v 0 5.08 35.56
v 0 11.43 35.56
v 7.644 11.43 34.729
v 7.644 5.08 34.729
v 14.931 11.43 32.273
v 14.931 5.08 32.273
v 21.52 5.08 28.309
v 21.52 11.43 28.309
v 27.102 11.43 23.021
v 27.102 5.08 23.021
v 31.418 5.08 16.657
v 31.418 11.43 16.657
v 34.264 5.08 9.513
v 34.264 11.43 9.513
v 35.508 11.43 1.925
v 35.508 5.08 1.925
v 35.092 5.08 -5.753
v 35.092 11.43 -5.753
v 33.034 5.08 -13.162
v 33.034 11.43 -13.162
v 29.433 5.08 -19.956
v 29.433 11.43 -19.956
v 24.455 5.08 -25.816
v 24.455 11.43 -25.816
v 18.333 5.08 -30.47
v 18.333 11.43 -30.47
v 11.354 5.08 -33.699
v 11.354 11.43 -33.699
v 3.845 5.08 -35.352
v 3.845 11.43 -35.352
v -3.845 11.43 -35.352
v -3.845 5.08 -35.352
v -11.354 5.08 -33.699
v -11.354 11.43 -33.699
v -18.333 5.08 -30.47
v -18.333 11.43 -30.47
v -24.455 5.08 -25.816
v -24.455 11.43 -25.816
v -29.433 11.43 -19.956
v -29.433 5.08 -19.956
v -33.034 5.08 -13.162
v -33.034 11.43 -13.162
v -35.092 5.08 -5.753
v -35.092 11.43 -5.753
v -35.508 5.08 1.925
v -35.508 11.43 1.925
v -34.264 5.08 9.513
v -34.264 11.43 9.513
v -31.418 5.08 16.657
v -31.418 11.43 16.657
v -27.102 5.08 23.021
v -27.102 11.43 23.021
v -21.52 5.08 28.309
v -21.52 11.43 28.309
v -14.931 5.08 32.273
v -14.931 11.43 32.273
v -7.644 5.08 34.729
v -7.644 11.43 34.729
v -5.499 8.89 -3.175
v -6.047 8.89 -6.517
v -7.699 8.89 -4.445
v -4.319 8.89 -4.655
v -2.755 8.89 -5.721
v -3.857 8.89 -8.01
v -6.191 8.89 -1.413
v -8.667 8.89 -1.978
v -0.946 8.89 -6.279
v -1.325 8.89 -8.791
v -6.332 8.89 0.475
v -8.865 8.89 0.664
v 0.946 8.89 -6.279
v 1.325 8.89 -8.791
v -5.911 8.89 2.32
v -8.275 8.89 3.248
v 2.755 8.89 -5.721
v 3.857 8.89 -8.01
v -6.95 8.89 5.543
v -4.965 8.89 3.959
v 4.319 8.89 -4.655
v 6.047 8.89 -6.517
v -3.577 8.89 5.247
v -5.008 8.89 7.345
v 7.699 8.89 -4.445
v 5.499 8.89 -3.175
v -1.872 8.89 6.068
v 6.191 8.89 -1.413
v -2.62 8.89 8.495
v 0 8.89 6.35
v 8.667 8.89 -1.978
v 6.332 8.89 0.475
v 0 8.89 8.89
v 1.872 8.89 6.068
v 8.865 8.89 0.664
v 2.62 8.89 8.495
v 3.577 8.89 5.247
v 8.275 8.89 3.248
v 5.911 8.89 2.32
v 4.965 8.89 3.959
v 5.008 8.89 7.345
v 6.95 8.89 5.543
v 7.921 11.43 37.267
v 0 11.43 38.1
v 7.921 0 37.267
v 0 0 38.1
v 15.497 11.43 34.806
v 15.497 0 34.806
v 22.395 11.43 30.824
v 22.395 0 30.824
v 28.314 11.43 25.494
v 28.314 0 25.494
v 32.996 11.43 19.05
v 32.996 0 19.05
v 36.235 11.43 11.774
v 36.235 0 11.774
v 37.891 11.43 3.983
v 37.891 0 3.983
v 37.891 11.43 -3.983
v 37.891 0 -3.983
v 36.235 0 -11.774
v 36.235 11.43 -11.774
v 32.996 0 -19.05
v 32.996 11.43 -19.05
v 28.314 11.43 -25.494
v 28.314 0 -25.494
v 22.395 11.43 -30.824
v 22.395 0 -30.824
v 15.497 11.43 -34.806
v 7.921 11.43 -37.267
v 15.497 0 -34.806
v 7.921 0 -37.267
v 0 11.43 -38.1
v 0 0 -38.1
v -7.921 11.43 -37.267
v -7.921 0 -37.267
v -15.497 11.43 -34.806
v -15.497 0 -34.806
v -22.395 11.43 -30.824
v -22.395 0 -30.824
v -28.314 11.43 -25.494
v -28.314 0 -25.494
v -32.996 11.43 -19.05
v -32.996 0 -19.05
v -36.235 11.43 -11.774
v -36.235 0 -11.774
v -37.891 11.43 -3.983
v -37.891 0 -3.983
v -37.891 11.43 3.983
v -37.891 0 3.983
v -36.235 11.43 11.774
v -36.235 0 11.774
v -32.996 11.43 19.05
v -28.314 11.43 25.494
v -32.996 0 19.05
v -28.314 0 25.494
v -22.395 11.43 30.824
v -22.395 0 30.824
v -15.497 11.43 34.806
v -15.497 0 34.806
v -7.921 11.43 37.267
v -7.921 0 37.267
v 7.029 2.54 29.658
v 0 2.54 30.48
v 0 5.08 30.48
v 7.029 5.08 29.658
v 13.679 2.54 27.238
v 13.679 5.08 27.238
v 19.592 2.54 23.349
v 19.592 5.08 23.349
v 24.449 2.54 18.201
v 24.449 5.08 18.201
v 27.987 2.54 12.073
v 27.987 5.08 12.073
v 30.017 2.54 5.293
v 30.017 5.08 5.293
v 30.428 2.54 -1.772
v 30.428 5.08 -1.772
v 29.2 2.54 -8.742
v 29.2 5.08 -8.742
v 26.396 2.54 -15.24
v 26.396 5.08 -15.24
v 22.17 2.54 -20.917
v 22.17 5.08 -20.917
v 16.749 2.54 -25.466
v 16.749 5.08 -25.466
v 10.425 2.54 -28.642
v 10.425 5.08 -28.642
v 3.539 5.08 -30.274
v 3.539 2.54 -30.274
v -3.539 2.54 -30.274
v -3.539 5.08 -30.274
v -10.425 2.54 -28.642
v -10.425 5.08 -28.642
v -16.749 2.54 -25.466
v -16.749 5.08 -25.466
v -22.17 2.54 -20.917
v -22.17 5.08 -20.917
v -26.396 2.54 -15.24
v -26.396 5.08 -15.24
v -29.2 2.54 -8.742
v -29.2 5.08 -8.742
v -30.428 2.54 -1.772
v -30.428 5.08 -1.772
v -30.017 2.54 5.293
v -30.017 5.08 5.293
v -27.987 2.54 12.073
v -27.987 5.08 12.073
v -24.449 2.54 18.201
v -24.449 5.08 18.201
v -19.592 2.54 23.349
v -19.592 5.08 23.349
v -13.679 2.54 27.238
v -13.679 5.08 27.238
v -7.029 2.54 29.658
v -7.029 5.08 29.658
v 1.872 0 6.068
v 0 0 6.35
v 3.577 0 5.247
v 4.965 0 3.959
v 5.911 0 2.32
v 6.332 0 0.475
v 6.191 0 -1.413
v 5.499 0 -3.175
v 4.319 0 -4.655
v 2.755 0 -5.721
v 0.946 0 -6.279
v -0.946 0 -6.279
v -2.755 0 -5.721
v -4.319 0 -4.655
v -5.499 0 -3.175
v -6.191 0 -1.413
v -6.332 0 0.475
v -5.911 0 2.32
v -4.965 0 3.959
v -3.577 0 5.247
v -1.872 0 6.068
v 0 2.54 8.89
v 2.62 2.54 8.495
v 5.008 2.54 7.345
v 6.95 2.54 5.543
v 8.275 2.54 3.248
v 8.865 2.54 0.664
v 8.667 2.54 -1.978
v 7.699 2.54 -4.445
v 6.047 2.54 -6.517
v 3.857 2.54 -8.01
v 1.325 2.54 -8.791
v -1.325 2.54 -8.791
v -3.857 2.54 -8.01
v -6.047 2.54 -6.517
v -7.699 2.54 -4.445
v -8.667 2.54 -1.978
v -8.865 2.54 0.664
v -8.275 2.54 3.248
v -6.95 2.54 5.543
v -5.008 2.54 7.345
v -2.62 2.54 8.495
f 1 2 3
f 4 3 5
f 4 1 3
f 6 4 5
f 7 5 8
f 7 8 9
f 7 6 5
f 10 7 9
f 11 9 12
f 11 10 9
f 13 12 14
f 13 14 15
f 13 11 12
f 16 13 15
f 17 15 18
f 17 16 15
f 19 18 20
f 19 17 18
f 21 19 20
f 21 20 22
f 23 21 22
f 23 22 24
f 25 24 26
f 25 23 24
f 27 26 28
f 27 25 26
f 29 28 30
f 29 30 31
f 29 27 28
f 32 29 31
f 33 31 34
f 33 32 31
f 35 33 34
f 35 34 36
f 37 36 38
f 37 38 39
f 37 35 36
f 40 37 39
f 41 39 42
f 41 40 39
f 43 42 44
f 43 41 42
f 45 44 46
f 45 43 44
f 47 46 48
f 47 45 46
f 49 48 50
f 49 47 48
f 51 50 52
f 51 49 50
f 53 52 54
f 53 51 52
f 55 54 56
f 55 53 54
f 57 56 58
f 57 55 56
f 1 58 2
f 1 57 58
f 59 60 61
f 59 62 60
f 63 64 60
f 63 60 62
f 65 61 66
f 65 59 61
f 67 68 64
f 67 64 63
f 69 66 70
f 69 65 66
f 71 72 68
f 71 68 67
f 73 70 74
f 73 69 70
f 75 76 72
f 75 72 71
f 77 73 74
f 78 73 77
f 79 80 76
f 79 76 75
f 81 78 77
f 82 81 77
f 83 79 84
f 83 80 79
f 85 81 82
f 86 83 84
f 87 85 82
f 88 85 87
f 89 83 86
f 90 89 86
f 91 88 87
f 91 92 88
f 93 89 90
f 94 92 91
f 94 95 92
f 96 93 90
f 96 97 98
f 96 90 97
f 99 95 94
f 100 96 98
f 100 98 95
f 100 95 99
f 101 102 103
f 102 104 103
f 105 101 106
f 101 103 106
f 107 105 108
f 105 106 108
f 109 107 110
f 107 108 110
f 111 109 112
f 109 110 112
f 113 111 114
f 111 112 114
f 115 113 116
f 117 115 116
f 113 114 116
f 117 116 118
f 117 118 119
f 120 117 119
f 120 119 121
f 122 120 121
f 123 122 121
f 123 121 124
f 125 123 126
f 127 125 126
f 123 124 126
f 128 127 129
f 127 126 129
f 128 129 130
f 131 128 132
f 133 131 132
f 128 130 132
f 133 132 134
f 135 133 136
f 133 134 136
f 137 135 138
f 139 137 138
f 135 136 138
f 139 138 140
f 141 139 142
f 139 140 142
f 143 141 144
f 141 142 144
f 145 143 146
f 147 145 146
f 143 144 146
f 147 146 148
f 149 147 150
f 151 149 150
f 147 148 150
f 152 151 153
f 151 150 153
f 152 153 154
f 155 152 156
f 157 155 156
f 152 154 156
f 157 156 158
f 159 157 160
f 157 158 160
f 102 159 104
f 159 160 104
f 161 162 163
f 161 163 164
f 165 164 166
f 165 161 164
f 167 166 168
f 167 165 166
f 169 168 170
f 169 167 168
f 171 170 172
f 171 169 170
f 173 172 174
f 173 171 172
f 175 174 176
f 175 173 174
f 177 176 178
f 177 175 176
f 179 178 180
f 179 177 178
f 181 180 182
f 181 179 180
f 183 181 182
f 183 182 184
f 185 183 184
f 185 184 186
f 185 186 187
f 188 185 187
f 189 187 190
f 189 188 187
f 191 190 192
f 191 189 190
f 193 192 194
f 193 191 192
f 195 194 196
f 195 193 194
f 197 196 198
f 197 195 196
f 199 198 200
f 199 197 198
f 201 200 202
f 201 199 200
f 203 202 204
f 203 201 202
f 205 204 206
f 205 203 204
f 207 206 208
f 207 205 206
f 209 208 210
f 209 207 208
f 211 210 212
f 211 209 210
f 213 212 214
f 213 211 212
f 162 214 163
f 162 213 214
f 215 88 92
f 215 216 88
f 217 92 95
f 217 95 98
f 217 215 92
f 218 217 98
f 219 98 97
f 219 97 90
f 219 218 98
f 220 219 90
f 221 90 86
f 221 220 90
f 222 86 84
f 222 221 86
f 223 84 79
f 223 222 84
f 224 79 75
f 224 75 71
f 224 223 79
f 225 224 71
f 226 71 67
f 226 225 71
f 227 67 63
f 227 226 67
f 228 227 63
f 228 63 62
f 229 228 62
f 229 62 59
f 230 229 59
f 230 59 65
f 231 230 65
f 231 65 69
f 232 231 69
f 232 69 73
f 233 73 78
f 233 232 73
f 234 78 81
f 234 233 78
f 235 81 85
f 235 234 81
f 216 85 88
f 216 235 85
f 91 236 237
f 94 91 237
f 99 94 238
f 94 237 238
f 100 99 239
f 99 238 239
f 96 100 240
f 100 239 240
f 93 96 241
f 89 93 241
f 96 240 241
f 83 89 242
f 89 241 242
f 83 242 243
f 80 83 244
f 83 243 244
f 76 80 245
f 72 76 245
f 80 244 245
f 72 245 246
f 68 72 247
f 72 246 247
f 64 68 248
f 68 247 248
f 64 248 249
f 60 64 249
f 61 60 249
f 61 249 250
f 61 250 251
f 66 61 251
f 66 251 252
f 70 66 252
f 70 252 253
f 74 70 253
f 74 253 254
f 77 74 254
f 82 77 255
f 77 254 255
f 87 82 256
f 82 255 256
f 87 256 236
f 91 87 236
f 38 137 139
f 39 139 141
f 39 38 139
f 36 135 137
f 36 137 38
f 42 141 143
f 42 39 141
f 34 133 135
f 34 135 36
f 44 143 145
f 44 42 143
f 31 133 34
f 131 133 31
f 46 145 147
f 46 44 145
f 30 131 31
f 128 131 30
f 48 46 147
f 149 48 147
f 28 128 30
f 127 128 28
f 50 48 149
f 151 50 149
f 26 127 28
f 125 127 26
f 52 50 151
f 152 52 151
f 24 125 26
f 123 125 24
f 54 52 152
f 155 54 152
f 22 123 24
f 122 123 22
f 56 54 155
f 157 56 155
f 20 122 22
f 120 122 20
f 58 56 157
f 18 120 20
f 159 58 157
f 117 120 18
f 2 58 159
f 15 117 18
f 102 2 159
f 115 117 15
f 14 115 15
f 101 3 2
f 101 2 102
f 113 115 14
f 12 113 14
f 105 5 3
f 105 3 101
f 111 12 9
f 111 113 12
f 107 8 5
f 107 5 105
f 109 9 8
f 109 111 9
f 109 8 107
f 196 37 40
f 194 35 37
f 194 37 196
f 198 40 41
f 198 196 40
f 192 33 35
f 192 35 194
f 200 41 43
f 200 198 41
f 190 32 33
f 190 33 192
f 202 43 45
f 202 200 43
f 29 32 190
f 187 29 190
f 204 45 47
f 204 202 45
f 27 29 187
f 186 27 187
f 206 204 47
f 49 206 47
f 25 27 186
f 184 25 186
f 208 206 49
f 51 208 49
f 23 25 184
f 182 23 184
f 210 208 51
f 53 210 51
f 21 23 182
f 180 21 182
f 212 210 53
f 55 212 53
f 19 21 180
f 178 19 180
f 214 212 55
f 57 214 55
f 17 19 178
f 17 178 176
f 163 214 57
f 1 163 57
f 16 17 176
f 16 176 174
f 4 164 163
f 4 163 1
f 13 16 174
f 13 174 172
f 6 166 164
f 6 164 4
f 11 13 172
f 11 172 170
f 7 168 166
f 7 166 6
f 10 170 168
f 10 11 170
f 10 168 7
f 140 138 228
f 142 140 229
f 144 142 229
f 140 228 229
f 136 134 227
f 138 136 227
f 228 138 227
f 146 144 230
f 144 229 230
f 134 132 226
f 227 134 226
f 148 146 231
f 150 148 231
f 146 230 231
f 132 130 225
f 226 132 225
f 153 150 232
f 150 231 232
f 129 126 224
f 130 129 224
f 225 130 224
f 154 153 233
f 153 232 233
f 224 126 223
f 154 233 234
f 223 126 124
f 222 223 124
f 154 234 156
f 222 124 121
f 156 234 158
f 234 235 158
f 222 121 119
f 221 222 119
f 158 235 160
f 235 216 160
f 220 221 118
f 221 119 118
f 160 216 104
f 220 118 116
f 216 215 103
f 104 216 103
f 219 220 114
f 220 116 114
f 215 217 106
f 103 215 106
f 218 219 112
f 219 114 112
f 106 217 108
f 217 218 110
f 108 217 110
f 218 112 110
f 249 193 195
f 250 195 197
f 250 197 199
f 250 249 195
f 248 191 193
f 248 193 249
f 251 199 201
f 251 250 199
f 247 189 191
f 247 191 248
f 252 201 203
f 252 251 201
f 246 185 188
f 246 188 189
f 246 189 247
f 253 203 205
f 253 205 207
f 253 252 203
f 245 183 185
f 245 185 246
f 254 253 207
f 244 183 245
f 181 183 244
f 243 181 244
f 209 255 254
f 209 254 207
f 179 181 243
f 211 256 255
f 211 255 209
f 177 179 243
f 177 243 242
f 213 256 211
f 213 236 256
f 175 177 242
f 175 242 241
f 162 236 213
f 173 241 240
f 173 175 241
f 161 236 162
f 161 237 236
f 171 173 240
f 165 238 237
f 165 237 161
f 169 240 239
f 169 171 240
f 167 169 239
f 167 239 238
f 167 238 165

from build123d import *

# Parameters (mm, degrees)
SKETCH1_R           = 38.1
SKETCH1_R_2         = 6.35
BOSS_EXTRUDE1_DEPTH = 2.54
SKETCH2_R           = 8.89
SKETCH2_R_2         = 6.35
BOSS_EXTRUDE2_DEPTH = 6.35
SKETCH5_R           = 38.1
SKETCH5_R_2         = 30.48
BOSS_EXTRUDE3_DEPTH = 2.54
SKETCH6_R           = 38.1
SKETCH6_R_2         = 35.56
BOSS_EXTRUDE4_DEPTH = 6.35


with BuildPart() as part:
    # Sketch1 → Boss-Extrude1 (new body)
    with BuildSketch(Plane(origin=(0, 0, 0), x_dir=(1, 0, 0), z_dir=(0, 1, 0))):
        with Locations(Location((0, 0, 0), (0, 0, 270))):
            Circle(SKETCH1_R)
        with Locations(Location((0, 0, 0), (0, 0, 270))):
            Circle(SKETCH1_R_2, mode=Mode.SUBTRACT)
    extrude(amount=BOSS_EXTRUDE1_DEPTH)

    # Sketch2 → Boss-Extrude2 (add)
    with BuildSketch(Plane(origin=(0, 2.54, 0), x_dir=(1, 0, 0), z_dir=(0, 1, 0))):
        with Locations(Location((0, 0, 0), (0, 0, 270))):
            Circle(SKETCH2_R)
        with Locations(Location((0, 0, 0), (0, 0, 270))):
            Circle(SKETCH2_R_2, mode=Mode.SUBTRACT)
    extrude(amount=BOSS_EXTRUDE2_DEPTH)

    # Sketch5 → Boss-Extrude3 (add)
    with BuildSketch(Plane(origin=(0, 2.54, 0), x_dir=(1, 0, 0), z_dir=(0, 1, 0))):
        with Locations(Location((0, 0, 0), (0, 0, 270))):
            Circle(SKETCH5_R)
        with Locations(Location((0, 0, 0), (0, 0, 270))):
            Circle(SKETCH5_R_2, mode=Mode.SUBTRACT)
    extrude(amount=BOSS_EXTRUDE3_DEPTH)

    # Sketch6 → Boss-Extrude4 (add)
    with BuildSketch(Plane(origin=(0, 5.08, 0), x_dir=(1, 0, 0), z_dir=(0, 1, 0))):
        with Locations(Location((0, 0, 0), (0, 0, 270))):
            Circle(SKETCH6_R)
        with Locations(Location((0, 0, 0), (0, 0, 270))):
            Circle(SKETCH6_R_2, mode=Mode.SUBTRACT)
    extrude(amount=BOSS_EXTRUDE4_DEPTH)


solid = part.part
